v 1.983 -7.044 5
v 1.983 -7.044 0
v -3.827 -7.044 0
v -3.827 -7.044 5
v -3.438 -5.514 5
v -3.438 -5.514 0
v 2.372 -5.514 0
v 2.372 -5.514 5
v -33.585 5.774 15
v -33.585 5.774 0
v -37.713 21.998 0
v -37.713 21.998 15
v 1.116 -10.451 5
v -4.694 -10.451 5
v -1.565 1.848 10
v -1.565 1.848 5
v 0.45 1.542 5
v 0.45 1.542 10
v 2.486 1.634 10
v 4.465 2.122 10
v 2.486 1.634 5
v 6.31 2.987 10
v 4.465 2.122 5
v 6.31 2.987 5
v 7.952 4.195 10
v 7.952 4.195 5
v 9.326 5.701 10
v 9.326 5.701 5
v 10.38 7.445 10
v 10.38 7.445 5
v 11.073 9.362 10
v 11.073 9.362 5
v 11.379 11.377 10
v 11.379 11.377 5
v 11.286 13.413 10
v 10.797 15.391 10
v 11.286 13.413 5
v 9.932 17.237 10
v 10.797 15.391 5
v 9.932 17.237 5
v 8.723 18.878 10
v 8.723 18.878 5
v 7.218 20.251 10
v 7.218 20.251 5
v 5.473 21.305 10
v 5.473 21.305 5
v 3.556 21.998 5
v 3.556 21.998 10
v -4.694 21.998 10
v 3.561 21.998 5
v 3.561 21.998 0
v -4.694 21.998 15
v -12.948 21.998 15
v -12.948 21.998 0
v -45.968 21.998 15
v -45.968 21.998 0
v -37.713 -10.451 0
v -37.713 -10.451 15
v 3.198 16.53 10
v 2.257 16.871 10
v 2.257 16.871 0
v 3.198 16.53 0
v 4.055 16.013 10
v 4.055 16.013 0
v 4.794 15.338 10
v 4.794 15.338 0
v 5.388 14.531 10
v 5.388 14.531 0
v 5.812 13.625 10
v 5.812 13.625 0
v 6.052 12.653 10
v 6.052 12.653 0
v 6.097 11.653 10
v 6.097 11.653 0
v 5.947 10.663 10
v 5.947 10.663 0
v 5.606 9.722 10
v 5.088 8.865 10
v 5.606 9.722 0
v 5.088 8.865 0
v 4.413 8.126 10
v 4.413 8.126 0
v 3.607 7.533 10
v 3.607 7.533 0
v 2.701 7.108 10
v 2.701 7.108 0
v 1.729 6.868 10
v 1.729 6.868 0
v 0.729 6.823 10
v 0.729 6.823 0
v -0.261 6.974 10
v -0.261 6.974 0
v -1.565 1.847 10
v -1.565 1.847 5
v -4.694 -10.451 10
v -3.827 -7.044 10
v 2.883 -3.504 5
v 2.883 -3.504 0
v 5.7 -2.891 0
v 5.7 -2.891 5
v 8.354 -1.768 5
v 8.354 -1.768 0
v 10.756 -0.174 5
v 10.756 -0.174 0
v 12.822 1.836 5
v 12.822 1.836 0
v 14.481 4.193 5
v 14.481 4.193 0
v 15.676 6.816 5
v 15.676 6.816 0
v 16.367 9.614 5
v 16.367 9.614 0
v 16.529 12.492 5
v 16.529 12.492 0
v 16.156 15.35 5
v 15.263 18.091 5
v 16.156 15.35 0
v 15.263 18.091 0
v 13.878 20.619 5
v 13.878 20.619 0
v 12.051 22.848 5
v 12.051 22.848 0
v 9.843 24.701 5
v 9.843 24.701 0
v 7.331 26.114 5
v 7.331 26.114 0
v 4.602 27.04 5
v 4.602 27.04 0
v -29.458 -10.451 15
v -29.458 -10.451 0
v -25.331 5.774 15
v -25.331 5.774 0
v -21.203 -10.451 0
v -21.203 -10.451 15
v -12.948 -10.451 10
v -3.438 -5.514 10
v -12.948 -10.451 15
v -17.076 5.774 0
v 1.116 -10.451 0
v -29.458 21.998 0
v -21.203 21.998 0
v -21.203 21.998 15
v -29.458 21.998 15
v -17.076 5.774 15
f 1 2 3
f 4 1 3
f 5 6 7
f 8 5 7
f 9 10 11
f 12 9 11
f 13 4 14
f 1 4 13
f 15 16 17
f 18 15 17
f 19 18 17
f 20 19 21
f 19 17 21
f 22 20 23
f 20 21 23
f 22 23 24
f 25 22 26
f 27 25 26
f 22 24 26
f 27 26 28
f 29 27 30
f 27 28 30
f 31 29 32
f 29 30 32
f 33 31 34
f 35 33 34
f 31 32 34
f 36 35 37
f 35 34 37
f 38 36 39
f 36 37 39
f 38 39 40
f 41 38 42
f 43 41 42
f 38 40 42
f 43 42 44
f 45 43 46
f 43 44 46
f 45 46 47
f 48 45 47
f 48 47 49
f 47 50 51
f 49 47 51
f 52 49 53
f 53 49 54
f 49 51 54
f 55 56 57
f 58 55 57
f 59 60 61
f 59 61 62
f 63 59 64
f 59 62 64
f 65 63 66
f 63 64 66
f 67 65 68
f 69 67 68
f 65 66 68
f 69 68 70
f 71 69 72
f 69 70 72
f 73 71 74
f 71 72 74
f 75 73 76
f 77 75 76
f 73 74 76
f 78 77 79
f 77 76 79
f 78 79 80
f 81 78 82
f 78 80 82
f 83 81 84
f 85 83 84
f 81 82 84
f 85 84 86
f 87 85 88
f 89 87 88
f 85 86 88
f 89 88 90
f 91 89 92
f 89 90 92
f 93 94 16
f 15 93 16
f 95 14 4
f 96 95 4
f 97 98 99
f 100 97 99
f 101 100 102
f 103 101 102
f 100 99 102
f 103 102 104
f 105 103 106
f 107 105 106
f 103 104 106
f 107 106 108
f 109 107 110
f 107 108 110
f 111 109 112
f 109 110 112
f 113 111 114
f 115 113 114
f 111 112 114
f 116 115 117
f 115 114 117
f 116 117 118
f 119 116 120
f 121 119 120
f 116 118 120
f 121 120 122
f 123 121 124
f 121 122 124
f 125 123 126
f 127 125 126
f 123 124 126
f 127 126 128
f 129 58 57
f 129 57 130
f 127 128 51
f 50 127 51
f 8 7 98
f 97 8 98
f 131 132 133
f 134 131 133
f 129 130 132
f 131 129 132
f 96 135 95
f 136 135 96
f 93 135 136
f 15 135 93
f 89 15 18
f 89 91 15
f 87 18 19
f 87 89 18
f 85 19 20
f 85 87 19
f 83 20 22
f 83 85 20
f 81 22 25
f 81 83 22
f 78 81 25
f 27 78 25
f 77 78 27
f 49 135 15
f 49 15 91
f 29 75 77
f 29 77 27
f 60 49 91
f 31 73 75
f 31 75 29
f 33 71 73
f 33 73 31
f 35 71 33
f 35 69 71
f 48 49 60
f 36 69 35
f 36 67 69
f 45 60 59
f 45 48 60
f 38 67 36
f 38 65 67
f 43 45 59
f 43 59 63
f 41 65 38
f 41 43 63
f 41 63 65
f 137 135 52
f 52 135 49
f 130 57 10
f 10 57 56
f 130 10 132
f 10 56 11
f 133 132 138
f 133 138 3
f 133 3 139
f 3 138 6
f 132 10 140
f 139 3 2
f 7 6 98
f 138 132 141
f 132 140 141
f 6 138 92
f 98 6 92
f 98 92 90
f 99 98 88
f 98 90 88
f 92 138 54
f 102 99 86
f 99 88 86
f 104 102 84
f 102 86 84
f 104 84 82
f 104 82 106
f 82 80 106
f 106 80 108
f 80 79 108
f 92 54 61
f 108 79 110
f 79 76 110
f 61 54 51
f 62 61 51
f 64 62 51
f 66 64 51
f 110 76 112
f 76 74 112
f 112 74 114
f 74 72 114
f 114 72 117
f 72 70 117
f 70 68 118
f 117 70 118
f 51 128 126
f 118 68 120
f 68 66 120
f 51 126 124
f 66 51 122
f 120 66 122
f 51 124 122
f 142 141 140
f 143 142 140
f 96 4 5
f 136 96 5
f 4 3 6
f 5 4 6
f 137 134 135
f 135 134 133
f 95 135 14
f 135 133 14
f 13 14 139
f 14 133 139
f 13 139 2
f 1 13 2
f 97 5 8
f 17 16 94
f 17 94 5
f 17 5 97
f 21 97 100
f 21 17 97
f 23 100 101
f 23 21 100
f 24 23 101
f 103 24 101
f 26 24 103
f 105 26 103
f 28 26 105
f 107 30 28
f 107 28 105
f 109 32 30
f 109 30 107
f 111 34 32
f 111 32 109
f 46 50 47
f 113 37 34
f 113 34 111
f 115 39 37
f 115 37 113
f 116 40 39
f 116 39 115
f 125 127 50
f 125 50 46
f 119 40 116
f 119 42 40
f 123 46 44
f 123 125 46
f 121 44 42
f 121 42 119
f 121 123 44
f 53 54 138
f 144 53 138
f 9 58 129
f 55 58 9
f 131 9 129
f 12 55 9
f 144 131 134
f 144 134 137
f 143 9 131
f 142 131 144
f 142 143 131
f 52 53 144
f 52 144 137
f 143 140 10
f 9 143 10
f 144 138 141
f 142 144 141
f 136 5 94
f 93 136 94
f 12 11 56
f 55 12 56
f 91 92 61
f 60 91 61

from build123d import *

# Parameters (mm, degrees)
F1_DEPTH = 15
F2_DEPTH = 10
F3_DEPTH = 5


with BuildPart() as f1:
    # F0 (on Top) → F1 (new body)
    with BuildSketch(Plane.XY):
        Polygon((-37.712831, 21.99769), (-45.967648, 21.99769), (-37.712831, -10.45064), (-29.458014, -10.45064), (-25.330606, 5.773525), (-21.203197, -10.45064), (-12.94838, -10.45064), (-4.693563, 21.99769), (-12.94838, 21.99769), (-17.075789, 5.773525), (-21.203197, 21.99769), (-29.458014, 21.99769), (-33.585422, 5.773525), align=None)
    extrude(amount=F1_DEPTH)

    # F0 (on Top) → F2 (join)
    with BuildSketch(Plane.XY):
        with BuildLine():
            Line((-4.693563, 21.99769), (-12.94838, -10.45064))
            Line((-12.94838, -10.45064), (-4.693563, -10.45064))
            Line((-4.693563, -10.45064), (-3.826923, -7.044018))
            Line((-3.826923, -7.044018), (-3.437773, -5.514332))
            Line((-3.437773, -5.514332), (-1.565072, 1.846947))
            Line((-1.565072, 1.846947), (-1.564775, 1.848116))
            ThreePointArc((-1.564775, 1.848116), (11.072878, 9.361753), (3.556356, 21.99769))
            Line((3.556356, 21.99769), (-4.693563, 21.99769))
        make_face()
        with BuildLine():
            ThreePointArc((2.257058, 16.871111), (5.946883, 10.663352), (-0.260876, 6.973526))
            Line((-0.260876, 6.973526), (2.257058, 16.871111))
        make_face(mode=Mode.SUBTRACT)
    extrude(amount=F2_DEPTH)

    # F0 (on Top) → F3 (join)
    with BuildSketch(Plane.XY):
        with BuildLine():
            Line((3.561253, 21.99769), (3.556356, 21.99769))
            ThreePointArc((3.556356, 21.99769), (11.072878, 9.361753), (-1.564775, 1.848116))
            Line((-1.564775, 1.848116), (-1.565072, 1.846947))
            Line((-1.565072, 1.846947), (-3.437773, -5.514332))
            Line((-3.437773, -5.514332), (2.371906, -5.514332))
            Line((2.371906, -5.514332), (2.883339, -3.503974))
            ThreePointArc((2.883339, -3.503974), (16.514622, 11.049437), (4.60158, 27.039842))
            Line((4.60158, 27.039842), (3.561253, 21.99769))
        make_face()
        Polygon((-3.826923, -7.044018), (-4.693563, -10.45064), (1.116115, -10.45064), (1.982756, -7.044018), align=None)
    extrude(amount=F3_DEPTH)


solid = f1.part
